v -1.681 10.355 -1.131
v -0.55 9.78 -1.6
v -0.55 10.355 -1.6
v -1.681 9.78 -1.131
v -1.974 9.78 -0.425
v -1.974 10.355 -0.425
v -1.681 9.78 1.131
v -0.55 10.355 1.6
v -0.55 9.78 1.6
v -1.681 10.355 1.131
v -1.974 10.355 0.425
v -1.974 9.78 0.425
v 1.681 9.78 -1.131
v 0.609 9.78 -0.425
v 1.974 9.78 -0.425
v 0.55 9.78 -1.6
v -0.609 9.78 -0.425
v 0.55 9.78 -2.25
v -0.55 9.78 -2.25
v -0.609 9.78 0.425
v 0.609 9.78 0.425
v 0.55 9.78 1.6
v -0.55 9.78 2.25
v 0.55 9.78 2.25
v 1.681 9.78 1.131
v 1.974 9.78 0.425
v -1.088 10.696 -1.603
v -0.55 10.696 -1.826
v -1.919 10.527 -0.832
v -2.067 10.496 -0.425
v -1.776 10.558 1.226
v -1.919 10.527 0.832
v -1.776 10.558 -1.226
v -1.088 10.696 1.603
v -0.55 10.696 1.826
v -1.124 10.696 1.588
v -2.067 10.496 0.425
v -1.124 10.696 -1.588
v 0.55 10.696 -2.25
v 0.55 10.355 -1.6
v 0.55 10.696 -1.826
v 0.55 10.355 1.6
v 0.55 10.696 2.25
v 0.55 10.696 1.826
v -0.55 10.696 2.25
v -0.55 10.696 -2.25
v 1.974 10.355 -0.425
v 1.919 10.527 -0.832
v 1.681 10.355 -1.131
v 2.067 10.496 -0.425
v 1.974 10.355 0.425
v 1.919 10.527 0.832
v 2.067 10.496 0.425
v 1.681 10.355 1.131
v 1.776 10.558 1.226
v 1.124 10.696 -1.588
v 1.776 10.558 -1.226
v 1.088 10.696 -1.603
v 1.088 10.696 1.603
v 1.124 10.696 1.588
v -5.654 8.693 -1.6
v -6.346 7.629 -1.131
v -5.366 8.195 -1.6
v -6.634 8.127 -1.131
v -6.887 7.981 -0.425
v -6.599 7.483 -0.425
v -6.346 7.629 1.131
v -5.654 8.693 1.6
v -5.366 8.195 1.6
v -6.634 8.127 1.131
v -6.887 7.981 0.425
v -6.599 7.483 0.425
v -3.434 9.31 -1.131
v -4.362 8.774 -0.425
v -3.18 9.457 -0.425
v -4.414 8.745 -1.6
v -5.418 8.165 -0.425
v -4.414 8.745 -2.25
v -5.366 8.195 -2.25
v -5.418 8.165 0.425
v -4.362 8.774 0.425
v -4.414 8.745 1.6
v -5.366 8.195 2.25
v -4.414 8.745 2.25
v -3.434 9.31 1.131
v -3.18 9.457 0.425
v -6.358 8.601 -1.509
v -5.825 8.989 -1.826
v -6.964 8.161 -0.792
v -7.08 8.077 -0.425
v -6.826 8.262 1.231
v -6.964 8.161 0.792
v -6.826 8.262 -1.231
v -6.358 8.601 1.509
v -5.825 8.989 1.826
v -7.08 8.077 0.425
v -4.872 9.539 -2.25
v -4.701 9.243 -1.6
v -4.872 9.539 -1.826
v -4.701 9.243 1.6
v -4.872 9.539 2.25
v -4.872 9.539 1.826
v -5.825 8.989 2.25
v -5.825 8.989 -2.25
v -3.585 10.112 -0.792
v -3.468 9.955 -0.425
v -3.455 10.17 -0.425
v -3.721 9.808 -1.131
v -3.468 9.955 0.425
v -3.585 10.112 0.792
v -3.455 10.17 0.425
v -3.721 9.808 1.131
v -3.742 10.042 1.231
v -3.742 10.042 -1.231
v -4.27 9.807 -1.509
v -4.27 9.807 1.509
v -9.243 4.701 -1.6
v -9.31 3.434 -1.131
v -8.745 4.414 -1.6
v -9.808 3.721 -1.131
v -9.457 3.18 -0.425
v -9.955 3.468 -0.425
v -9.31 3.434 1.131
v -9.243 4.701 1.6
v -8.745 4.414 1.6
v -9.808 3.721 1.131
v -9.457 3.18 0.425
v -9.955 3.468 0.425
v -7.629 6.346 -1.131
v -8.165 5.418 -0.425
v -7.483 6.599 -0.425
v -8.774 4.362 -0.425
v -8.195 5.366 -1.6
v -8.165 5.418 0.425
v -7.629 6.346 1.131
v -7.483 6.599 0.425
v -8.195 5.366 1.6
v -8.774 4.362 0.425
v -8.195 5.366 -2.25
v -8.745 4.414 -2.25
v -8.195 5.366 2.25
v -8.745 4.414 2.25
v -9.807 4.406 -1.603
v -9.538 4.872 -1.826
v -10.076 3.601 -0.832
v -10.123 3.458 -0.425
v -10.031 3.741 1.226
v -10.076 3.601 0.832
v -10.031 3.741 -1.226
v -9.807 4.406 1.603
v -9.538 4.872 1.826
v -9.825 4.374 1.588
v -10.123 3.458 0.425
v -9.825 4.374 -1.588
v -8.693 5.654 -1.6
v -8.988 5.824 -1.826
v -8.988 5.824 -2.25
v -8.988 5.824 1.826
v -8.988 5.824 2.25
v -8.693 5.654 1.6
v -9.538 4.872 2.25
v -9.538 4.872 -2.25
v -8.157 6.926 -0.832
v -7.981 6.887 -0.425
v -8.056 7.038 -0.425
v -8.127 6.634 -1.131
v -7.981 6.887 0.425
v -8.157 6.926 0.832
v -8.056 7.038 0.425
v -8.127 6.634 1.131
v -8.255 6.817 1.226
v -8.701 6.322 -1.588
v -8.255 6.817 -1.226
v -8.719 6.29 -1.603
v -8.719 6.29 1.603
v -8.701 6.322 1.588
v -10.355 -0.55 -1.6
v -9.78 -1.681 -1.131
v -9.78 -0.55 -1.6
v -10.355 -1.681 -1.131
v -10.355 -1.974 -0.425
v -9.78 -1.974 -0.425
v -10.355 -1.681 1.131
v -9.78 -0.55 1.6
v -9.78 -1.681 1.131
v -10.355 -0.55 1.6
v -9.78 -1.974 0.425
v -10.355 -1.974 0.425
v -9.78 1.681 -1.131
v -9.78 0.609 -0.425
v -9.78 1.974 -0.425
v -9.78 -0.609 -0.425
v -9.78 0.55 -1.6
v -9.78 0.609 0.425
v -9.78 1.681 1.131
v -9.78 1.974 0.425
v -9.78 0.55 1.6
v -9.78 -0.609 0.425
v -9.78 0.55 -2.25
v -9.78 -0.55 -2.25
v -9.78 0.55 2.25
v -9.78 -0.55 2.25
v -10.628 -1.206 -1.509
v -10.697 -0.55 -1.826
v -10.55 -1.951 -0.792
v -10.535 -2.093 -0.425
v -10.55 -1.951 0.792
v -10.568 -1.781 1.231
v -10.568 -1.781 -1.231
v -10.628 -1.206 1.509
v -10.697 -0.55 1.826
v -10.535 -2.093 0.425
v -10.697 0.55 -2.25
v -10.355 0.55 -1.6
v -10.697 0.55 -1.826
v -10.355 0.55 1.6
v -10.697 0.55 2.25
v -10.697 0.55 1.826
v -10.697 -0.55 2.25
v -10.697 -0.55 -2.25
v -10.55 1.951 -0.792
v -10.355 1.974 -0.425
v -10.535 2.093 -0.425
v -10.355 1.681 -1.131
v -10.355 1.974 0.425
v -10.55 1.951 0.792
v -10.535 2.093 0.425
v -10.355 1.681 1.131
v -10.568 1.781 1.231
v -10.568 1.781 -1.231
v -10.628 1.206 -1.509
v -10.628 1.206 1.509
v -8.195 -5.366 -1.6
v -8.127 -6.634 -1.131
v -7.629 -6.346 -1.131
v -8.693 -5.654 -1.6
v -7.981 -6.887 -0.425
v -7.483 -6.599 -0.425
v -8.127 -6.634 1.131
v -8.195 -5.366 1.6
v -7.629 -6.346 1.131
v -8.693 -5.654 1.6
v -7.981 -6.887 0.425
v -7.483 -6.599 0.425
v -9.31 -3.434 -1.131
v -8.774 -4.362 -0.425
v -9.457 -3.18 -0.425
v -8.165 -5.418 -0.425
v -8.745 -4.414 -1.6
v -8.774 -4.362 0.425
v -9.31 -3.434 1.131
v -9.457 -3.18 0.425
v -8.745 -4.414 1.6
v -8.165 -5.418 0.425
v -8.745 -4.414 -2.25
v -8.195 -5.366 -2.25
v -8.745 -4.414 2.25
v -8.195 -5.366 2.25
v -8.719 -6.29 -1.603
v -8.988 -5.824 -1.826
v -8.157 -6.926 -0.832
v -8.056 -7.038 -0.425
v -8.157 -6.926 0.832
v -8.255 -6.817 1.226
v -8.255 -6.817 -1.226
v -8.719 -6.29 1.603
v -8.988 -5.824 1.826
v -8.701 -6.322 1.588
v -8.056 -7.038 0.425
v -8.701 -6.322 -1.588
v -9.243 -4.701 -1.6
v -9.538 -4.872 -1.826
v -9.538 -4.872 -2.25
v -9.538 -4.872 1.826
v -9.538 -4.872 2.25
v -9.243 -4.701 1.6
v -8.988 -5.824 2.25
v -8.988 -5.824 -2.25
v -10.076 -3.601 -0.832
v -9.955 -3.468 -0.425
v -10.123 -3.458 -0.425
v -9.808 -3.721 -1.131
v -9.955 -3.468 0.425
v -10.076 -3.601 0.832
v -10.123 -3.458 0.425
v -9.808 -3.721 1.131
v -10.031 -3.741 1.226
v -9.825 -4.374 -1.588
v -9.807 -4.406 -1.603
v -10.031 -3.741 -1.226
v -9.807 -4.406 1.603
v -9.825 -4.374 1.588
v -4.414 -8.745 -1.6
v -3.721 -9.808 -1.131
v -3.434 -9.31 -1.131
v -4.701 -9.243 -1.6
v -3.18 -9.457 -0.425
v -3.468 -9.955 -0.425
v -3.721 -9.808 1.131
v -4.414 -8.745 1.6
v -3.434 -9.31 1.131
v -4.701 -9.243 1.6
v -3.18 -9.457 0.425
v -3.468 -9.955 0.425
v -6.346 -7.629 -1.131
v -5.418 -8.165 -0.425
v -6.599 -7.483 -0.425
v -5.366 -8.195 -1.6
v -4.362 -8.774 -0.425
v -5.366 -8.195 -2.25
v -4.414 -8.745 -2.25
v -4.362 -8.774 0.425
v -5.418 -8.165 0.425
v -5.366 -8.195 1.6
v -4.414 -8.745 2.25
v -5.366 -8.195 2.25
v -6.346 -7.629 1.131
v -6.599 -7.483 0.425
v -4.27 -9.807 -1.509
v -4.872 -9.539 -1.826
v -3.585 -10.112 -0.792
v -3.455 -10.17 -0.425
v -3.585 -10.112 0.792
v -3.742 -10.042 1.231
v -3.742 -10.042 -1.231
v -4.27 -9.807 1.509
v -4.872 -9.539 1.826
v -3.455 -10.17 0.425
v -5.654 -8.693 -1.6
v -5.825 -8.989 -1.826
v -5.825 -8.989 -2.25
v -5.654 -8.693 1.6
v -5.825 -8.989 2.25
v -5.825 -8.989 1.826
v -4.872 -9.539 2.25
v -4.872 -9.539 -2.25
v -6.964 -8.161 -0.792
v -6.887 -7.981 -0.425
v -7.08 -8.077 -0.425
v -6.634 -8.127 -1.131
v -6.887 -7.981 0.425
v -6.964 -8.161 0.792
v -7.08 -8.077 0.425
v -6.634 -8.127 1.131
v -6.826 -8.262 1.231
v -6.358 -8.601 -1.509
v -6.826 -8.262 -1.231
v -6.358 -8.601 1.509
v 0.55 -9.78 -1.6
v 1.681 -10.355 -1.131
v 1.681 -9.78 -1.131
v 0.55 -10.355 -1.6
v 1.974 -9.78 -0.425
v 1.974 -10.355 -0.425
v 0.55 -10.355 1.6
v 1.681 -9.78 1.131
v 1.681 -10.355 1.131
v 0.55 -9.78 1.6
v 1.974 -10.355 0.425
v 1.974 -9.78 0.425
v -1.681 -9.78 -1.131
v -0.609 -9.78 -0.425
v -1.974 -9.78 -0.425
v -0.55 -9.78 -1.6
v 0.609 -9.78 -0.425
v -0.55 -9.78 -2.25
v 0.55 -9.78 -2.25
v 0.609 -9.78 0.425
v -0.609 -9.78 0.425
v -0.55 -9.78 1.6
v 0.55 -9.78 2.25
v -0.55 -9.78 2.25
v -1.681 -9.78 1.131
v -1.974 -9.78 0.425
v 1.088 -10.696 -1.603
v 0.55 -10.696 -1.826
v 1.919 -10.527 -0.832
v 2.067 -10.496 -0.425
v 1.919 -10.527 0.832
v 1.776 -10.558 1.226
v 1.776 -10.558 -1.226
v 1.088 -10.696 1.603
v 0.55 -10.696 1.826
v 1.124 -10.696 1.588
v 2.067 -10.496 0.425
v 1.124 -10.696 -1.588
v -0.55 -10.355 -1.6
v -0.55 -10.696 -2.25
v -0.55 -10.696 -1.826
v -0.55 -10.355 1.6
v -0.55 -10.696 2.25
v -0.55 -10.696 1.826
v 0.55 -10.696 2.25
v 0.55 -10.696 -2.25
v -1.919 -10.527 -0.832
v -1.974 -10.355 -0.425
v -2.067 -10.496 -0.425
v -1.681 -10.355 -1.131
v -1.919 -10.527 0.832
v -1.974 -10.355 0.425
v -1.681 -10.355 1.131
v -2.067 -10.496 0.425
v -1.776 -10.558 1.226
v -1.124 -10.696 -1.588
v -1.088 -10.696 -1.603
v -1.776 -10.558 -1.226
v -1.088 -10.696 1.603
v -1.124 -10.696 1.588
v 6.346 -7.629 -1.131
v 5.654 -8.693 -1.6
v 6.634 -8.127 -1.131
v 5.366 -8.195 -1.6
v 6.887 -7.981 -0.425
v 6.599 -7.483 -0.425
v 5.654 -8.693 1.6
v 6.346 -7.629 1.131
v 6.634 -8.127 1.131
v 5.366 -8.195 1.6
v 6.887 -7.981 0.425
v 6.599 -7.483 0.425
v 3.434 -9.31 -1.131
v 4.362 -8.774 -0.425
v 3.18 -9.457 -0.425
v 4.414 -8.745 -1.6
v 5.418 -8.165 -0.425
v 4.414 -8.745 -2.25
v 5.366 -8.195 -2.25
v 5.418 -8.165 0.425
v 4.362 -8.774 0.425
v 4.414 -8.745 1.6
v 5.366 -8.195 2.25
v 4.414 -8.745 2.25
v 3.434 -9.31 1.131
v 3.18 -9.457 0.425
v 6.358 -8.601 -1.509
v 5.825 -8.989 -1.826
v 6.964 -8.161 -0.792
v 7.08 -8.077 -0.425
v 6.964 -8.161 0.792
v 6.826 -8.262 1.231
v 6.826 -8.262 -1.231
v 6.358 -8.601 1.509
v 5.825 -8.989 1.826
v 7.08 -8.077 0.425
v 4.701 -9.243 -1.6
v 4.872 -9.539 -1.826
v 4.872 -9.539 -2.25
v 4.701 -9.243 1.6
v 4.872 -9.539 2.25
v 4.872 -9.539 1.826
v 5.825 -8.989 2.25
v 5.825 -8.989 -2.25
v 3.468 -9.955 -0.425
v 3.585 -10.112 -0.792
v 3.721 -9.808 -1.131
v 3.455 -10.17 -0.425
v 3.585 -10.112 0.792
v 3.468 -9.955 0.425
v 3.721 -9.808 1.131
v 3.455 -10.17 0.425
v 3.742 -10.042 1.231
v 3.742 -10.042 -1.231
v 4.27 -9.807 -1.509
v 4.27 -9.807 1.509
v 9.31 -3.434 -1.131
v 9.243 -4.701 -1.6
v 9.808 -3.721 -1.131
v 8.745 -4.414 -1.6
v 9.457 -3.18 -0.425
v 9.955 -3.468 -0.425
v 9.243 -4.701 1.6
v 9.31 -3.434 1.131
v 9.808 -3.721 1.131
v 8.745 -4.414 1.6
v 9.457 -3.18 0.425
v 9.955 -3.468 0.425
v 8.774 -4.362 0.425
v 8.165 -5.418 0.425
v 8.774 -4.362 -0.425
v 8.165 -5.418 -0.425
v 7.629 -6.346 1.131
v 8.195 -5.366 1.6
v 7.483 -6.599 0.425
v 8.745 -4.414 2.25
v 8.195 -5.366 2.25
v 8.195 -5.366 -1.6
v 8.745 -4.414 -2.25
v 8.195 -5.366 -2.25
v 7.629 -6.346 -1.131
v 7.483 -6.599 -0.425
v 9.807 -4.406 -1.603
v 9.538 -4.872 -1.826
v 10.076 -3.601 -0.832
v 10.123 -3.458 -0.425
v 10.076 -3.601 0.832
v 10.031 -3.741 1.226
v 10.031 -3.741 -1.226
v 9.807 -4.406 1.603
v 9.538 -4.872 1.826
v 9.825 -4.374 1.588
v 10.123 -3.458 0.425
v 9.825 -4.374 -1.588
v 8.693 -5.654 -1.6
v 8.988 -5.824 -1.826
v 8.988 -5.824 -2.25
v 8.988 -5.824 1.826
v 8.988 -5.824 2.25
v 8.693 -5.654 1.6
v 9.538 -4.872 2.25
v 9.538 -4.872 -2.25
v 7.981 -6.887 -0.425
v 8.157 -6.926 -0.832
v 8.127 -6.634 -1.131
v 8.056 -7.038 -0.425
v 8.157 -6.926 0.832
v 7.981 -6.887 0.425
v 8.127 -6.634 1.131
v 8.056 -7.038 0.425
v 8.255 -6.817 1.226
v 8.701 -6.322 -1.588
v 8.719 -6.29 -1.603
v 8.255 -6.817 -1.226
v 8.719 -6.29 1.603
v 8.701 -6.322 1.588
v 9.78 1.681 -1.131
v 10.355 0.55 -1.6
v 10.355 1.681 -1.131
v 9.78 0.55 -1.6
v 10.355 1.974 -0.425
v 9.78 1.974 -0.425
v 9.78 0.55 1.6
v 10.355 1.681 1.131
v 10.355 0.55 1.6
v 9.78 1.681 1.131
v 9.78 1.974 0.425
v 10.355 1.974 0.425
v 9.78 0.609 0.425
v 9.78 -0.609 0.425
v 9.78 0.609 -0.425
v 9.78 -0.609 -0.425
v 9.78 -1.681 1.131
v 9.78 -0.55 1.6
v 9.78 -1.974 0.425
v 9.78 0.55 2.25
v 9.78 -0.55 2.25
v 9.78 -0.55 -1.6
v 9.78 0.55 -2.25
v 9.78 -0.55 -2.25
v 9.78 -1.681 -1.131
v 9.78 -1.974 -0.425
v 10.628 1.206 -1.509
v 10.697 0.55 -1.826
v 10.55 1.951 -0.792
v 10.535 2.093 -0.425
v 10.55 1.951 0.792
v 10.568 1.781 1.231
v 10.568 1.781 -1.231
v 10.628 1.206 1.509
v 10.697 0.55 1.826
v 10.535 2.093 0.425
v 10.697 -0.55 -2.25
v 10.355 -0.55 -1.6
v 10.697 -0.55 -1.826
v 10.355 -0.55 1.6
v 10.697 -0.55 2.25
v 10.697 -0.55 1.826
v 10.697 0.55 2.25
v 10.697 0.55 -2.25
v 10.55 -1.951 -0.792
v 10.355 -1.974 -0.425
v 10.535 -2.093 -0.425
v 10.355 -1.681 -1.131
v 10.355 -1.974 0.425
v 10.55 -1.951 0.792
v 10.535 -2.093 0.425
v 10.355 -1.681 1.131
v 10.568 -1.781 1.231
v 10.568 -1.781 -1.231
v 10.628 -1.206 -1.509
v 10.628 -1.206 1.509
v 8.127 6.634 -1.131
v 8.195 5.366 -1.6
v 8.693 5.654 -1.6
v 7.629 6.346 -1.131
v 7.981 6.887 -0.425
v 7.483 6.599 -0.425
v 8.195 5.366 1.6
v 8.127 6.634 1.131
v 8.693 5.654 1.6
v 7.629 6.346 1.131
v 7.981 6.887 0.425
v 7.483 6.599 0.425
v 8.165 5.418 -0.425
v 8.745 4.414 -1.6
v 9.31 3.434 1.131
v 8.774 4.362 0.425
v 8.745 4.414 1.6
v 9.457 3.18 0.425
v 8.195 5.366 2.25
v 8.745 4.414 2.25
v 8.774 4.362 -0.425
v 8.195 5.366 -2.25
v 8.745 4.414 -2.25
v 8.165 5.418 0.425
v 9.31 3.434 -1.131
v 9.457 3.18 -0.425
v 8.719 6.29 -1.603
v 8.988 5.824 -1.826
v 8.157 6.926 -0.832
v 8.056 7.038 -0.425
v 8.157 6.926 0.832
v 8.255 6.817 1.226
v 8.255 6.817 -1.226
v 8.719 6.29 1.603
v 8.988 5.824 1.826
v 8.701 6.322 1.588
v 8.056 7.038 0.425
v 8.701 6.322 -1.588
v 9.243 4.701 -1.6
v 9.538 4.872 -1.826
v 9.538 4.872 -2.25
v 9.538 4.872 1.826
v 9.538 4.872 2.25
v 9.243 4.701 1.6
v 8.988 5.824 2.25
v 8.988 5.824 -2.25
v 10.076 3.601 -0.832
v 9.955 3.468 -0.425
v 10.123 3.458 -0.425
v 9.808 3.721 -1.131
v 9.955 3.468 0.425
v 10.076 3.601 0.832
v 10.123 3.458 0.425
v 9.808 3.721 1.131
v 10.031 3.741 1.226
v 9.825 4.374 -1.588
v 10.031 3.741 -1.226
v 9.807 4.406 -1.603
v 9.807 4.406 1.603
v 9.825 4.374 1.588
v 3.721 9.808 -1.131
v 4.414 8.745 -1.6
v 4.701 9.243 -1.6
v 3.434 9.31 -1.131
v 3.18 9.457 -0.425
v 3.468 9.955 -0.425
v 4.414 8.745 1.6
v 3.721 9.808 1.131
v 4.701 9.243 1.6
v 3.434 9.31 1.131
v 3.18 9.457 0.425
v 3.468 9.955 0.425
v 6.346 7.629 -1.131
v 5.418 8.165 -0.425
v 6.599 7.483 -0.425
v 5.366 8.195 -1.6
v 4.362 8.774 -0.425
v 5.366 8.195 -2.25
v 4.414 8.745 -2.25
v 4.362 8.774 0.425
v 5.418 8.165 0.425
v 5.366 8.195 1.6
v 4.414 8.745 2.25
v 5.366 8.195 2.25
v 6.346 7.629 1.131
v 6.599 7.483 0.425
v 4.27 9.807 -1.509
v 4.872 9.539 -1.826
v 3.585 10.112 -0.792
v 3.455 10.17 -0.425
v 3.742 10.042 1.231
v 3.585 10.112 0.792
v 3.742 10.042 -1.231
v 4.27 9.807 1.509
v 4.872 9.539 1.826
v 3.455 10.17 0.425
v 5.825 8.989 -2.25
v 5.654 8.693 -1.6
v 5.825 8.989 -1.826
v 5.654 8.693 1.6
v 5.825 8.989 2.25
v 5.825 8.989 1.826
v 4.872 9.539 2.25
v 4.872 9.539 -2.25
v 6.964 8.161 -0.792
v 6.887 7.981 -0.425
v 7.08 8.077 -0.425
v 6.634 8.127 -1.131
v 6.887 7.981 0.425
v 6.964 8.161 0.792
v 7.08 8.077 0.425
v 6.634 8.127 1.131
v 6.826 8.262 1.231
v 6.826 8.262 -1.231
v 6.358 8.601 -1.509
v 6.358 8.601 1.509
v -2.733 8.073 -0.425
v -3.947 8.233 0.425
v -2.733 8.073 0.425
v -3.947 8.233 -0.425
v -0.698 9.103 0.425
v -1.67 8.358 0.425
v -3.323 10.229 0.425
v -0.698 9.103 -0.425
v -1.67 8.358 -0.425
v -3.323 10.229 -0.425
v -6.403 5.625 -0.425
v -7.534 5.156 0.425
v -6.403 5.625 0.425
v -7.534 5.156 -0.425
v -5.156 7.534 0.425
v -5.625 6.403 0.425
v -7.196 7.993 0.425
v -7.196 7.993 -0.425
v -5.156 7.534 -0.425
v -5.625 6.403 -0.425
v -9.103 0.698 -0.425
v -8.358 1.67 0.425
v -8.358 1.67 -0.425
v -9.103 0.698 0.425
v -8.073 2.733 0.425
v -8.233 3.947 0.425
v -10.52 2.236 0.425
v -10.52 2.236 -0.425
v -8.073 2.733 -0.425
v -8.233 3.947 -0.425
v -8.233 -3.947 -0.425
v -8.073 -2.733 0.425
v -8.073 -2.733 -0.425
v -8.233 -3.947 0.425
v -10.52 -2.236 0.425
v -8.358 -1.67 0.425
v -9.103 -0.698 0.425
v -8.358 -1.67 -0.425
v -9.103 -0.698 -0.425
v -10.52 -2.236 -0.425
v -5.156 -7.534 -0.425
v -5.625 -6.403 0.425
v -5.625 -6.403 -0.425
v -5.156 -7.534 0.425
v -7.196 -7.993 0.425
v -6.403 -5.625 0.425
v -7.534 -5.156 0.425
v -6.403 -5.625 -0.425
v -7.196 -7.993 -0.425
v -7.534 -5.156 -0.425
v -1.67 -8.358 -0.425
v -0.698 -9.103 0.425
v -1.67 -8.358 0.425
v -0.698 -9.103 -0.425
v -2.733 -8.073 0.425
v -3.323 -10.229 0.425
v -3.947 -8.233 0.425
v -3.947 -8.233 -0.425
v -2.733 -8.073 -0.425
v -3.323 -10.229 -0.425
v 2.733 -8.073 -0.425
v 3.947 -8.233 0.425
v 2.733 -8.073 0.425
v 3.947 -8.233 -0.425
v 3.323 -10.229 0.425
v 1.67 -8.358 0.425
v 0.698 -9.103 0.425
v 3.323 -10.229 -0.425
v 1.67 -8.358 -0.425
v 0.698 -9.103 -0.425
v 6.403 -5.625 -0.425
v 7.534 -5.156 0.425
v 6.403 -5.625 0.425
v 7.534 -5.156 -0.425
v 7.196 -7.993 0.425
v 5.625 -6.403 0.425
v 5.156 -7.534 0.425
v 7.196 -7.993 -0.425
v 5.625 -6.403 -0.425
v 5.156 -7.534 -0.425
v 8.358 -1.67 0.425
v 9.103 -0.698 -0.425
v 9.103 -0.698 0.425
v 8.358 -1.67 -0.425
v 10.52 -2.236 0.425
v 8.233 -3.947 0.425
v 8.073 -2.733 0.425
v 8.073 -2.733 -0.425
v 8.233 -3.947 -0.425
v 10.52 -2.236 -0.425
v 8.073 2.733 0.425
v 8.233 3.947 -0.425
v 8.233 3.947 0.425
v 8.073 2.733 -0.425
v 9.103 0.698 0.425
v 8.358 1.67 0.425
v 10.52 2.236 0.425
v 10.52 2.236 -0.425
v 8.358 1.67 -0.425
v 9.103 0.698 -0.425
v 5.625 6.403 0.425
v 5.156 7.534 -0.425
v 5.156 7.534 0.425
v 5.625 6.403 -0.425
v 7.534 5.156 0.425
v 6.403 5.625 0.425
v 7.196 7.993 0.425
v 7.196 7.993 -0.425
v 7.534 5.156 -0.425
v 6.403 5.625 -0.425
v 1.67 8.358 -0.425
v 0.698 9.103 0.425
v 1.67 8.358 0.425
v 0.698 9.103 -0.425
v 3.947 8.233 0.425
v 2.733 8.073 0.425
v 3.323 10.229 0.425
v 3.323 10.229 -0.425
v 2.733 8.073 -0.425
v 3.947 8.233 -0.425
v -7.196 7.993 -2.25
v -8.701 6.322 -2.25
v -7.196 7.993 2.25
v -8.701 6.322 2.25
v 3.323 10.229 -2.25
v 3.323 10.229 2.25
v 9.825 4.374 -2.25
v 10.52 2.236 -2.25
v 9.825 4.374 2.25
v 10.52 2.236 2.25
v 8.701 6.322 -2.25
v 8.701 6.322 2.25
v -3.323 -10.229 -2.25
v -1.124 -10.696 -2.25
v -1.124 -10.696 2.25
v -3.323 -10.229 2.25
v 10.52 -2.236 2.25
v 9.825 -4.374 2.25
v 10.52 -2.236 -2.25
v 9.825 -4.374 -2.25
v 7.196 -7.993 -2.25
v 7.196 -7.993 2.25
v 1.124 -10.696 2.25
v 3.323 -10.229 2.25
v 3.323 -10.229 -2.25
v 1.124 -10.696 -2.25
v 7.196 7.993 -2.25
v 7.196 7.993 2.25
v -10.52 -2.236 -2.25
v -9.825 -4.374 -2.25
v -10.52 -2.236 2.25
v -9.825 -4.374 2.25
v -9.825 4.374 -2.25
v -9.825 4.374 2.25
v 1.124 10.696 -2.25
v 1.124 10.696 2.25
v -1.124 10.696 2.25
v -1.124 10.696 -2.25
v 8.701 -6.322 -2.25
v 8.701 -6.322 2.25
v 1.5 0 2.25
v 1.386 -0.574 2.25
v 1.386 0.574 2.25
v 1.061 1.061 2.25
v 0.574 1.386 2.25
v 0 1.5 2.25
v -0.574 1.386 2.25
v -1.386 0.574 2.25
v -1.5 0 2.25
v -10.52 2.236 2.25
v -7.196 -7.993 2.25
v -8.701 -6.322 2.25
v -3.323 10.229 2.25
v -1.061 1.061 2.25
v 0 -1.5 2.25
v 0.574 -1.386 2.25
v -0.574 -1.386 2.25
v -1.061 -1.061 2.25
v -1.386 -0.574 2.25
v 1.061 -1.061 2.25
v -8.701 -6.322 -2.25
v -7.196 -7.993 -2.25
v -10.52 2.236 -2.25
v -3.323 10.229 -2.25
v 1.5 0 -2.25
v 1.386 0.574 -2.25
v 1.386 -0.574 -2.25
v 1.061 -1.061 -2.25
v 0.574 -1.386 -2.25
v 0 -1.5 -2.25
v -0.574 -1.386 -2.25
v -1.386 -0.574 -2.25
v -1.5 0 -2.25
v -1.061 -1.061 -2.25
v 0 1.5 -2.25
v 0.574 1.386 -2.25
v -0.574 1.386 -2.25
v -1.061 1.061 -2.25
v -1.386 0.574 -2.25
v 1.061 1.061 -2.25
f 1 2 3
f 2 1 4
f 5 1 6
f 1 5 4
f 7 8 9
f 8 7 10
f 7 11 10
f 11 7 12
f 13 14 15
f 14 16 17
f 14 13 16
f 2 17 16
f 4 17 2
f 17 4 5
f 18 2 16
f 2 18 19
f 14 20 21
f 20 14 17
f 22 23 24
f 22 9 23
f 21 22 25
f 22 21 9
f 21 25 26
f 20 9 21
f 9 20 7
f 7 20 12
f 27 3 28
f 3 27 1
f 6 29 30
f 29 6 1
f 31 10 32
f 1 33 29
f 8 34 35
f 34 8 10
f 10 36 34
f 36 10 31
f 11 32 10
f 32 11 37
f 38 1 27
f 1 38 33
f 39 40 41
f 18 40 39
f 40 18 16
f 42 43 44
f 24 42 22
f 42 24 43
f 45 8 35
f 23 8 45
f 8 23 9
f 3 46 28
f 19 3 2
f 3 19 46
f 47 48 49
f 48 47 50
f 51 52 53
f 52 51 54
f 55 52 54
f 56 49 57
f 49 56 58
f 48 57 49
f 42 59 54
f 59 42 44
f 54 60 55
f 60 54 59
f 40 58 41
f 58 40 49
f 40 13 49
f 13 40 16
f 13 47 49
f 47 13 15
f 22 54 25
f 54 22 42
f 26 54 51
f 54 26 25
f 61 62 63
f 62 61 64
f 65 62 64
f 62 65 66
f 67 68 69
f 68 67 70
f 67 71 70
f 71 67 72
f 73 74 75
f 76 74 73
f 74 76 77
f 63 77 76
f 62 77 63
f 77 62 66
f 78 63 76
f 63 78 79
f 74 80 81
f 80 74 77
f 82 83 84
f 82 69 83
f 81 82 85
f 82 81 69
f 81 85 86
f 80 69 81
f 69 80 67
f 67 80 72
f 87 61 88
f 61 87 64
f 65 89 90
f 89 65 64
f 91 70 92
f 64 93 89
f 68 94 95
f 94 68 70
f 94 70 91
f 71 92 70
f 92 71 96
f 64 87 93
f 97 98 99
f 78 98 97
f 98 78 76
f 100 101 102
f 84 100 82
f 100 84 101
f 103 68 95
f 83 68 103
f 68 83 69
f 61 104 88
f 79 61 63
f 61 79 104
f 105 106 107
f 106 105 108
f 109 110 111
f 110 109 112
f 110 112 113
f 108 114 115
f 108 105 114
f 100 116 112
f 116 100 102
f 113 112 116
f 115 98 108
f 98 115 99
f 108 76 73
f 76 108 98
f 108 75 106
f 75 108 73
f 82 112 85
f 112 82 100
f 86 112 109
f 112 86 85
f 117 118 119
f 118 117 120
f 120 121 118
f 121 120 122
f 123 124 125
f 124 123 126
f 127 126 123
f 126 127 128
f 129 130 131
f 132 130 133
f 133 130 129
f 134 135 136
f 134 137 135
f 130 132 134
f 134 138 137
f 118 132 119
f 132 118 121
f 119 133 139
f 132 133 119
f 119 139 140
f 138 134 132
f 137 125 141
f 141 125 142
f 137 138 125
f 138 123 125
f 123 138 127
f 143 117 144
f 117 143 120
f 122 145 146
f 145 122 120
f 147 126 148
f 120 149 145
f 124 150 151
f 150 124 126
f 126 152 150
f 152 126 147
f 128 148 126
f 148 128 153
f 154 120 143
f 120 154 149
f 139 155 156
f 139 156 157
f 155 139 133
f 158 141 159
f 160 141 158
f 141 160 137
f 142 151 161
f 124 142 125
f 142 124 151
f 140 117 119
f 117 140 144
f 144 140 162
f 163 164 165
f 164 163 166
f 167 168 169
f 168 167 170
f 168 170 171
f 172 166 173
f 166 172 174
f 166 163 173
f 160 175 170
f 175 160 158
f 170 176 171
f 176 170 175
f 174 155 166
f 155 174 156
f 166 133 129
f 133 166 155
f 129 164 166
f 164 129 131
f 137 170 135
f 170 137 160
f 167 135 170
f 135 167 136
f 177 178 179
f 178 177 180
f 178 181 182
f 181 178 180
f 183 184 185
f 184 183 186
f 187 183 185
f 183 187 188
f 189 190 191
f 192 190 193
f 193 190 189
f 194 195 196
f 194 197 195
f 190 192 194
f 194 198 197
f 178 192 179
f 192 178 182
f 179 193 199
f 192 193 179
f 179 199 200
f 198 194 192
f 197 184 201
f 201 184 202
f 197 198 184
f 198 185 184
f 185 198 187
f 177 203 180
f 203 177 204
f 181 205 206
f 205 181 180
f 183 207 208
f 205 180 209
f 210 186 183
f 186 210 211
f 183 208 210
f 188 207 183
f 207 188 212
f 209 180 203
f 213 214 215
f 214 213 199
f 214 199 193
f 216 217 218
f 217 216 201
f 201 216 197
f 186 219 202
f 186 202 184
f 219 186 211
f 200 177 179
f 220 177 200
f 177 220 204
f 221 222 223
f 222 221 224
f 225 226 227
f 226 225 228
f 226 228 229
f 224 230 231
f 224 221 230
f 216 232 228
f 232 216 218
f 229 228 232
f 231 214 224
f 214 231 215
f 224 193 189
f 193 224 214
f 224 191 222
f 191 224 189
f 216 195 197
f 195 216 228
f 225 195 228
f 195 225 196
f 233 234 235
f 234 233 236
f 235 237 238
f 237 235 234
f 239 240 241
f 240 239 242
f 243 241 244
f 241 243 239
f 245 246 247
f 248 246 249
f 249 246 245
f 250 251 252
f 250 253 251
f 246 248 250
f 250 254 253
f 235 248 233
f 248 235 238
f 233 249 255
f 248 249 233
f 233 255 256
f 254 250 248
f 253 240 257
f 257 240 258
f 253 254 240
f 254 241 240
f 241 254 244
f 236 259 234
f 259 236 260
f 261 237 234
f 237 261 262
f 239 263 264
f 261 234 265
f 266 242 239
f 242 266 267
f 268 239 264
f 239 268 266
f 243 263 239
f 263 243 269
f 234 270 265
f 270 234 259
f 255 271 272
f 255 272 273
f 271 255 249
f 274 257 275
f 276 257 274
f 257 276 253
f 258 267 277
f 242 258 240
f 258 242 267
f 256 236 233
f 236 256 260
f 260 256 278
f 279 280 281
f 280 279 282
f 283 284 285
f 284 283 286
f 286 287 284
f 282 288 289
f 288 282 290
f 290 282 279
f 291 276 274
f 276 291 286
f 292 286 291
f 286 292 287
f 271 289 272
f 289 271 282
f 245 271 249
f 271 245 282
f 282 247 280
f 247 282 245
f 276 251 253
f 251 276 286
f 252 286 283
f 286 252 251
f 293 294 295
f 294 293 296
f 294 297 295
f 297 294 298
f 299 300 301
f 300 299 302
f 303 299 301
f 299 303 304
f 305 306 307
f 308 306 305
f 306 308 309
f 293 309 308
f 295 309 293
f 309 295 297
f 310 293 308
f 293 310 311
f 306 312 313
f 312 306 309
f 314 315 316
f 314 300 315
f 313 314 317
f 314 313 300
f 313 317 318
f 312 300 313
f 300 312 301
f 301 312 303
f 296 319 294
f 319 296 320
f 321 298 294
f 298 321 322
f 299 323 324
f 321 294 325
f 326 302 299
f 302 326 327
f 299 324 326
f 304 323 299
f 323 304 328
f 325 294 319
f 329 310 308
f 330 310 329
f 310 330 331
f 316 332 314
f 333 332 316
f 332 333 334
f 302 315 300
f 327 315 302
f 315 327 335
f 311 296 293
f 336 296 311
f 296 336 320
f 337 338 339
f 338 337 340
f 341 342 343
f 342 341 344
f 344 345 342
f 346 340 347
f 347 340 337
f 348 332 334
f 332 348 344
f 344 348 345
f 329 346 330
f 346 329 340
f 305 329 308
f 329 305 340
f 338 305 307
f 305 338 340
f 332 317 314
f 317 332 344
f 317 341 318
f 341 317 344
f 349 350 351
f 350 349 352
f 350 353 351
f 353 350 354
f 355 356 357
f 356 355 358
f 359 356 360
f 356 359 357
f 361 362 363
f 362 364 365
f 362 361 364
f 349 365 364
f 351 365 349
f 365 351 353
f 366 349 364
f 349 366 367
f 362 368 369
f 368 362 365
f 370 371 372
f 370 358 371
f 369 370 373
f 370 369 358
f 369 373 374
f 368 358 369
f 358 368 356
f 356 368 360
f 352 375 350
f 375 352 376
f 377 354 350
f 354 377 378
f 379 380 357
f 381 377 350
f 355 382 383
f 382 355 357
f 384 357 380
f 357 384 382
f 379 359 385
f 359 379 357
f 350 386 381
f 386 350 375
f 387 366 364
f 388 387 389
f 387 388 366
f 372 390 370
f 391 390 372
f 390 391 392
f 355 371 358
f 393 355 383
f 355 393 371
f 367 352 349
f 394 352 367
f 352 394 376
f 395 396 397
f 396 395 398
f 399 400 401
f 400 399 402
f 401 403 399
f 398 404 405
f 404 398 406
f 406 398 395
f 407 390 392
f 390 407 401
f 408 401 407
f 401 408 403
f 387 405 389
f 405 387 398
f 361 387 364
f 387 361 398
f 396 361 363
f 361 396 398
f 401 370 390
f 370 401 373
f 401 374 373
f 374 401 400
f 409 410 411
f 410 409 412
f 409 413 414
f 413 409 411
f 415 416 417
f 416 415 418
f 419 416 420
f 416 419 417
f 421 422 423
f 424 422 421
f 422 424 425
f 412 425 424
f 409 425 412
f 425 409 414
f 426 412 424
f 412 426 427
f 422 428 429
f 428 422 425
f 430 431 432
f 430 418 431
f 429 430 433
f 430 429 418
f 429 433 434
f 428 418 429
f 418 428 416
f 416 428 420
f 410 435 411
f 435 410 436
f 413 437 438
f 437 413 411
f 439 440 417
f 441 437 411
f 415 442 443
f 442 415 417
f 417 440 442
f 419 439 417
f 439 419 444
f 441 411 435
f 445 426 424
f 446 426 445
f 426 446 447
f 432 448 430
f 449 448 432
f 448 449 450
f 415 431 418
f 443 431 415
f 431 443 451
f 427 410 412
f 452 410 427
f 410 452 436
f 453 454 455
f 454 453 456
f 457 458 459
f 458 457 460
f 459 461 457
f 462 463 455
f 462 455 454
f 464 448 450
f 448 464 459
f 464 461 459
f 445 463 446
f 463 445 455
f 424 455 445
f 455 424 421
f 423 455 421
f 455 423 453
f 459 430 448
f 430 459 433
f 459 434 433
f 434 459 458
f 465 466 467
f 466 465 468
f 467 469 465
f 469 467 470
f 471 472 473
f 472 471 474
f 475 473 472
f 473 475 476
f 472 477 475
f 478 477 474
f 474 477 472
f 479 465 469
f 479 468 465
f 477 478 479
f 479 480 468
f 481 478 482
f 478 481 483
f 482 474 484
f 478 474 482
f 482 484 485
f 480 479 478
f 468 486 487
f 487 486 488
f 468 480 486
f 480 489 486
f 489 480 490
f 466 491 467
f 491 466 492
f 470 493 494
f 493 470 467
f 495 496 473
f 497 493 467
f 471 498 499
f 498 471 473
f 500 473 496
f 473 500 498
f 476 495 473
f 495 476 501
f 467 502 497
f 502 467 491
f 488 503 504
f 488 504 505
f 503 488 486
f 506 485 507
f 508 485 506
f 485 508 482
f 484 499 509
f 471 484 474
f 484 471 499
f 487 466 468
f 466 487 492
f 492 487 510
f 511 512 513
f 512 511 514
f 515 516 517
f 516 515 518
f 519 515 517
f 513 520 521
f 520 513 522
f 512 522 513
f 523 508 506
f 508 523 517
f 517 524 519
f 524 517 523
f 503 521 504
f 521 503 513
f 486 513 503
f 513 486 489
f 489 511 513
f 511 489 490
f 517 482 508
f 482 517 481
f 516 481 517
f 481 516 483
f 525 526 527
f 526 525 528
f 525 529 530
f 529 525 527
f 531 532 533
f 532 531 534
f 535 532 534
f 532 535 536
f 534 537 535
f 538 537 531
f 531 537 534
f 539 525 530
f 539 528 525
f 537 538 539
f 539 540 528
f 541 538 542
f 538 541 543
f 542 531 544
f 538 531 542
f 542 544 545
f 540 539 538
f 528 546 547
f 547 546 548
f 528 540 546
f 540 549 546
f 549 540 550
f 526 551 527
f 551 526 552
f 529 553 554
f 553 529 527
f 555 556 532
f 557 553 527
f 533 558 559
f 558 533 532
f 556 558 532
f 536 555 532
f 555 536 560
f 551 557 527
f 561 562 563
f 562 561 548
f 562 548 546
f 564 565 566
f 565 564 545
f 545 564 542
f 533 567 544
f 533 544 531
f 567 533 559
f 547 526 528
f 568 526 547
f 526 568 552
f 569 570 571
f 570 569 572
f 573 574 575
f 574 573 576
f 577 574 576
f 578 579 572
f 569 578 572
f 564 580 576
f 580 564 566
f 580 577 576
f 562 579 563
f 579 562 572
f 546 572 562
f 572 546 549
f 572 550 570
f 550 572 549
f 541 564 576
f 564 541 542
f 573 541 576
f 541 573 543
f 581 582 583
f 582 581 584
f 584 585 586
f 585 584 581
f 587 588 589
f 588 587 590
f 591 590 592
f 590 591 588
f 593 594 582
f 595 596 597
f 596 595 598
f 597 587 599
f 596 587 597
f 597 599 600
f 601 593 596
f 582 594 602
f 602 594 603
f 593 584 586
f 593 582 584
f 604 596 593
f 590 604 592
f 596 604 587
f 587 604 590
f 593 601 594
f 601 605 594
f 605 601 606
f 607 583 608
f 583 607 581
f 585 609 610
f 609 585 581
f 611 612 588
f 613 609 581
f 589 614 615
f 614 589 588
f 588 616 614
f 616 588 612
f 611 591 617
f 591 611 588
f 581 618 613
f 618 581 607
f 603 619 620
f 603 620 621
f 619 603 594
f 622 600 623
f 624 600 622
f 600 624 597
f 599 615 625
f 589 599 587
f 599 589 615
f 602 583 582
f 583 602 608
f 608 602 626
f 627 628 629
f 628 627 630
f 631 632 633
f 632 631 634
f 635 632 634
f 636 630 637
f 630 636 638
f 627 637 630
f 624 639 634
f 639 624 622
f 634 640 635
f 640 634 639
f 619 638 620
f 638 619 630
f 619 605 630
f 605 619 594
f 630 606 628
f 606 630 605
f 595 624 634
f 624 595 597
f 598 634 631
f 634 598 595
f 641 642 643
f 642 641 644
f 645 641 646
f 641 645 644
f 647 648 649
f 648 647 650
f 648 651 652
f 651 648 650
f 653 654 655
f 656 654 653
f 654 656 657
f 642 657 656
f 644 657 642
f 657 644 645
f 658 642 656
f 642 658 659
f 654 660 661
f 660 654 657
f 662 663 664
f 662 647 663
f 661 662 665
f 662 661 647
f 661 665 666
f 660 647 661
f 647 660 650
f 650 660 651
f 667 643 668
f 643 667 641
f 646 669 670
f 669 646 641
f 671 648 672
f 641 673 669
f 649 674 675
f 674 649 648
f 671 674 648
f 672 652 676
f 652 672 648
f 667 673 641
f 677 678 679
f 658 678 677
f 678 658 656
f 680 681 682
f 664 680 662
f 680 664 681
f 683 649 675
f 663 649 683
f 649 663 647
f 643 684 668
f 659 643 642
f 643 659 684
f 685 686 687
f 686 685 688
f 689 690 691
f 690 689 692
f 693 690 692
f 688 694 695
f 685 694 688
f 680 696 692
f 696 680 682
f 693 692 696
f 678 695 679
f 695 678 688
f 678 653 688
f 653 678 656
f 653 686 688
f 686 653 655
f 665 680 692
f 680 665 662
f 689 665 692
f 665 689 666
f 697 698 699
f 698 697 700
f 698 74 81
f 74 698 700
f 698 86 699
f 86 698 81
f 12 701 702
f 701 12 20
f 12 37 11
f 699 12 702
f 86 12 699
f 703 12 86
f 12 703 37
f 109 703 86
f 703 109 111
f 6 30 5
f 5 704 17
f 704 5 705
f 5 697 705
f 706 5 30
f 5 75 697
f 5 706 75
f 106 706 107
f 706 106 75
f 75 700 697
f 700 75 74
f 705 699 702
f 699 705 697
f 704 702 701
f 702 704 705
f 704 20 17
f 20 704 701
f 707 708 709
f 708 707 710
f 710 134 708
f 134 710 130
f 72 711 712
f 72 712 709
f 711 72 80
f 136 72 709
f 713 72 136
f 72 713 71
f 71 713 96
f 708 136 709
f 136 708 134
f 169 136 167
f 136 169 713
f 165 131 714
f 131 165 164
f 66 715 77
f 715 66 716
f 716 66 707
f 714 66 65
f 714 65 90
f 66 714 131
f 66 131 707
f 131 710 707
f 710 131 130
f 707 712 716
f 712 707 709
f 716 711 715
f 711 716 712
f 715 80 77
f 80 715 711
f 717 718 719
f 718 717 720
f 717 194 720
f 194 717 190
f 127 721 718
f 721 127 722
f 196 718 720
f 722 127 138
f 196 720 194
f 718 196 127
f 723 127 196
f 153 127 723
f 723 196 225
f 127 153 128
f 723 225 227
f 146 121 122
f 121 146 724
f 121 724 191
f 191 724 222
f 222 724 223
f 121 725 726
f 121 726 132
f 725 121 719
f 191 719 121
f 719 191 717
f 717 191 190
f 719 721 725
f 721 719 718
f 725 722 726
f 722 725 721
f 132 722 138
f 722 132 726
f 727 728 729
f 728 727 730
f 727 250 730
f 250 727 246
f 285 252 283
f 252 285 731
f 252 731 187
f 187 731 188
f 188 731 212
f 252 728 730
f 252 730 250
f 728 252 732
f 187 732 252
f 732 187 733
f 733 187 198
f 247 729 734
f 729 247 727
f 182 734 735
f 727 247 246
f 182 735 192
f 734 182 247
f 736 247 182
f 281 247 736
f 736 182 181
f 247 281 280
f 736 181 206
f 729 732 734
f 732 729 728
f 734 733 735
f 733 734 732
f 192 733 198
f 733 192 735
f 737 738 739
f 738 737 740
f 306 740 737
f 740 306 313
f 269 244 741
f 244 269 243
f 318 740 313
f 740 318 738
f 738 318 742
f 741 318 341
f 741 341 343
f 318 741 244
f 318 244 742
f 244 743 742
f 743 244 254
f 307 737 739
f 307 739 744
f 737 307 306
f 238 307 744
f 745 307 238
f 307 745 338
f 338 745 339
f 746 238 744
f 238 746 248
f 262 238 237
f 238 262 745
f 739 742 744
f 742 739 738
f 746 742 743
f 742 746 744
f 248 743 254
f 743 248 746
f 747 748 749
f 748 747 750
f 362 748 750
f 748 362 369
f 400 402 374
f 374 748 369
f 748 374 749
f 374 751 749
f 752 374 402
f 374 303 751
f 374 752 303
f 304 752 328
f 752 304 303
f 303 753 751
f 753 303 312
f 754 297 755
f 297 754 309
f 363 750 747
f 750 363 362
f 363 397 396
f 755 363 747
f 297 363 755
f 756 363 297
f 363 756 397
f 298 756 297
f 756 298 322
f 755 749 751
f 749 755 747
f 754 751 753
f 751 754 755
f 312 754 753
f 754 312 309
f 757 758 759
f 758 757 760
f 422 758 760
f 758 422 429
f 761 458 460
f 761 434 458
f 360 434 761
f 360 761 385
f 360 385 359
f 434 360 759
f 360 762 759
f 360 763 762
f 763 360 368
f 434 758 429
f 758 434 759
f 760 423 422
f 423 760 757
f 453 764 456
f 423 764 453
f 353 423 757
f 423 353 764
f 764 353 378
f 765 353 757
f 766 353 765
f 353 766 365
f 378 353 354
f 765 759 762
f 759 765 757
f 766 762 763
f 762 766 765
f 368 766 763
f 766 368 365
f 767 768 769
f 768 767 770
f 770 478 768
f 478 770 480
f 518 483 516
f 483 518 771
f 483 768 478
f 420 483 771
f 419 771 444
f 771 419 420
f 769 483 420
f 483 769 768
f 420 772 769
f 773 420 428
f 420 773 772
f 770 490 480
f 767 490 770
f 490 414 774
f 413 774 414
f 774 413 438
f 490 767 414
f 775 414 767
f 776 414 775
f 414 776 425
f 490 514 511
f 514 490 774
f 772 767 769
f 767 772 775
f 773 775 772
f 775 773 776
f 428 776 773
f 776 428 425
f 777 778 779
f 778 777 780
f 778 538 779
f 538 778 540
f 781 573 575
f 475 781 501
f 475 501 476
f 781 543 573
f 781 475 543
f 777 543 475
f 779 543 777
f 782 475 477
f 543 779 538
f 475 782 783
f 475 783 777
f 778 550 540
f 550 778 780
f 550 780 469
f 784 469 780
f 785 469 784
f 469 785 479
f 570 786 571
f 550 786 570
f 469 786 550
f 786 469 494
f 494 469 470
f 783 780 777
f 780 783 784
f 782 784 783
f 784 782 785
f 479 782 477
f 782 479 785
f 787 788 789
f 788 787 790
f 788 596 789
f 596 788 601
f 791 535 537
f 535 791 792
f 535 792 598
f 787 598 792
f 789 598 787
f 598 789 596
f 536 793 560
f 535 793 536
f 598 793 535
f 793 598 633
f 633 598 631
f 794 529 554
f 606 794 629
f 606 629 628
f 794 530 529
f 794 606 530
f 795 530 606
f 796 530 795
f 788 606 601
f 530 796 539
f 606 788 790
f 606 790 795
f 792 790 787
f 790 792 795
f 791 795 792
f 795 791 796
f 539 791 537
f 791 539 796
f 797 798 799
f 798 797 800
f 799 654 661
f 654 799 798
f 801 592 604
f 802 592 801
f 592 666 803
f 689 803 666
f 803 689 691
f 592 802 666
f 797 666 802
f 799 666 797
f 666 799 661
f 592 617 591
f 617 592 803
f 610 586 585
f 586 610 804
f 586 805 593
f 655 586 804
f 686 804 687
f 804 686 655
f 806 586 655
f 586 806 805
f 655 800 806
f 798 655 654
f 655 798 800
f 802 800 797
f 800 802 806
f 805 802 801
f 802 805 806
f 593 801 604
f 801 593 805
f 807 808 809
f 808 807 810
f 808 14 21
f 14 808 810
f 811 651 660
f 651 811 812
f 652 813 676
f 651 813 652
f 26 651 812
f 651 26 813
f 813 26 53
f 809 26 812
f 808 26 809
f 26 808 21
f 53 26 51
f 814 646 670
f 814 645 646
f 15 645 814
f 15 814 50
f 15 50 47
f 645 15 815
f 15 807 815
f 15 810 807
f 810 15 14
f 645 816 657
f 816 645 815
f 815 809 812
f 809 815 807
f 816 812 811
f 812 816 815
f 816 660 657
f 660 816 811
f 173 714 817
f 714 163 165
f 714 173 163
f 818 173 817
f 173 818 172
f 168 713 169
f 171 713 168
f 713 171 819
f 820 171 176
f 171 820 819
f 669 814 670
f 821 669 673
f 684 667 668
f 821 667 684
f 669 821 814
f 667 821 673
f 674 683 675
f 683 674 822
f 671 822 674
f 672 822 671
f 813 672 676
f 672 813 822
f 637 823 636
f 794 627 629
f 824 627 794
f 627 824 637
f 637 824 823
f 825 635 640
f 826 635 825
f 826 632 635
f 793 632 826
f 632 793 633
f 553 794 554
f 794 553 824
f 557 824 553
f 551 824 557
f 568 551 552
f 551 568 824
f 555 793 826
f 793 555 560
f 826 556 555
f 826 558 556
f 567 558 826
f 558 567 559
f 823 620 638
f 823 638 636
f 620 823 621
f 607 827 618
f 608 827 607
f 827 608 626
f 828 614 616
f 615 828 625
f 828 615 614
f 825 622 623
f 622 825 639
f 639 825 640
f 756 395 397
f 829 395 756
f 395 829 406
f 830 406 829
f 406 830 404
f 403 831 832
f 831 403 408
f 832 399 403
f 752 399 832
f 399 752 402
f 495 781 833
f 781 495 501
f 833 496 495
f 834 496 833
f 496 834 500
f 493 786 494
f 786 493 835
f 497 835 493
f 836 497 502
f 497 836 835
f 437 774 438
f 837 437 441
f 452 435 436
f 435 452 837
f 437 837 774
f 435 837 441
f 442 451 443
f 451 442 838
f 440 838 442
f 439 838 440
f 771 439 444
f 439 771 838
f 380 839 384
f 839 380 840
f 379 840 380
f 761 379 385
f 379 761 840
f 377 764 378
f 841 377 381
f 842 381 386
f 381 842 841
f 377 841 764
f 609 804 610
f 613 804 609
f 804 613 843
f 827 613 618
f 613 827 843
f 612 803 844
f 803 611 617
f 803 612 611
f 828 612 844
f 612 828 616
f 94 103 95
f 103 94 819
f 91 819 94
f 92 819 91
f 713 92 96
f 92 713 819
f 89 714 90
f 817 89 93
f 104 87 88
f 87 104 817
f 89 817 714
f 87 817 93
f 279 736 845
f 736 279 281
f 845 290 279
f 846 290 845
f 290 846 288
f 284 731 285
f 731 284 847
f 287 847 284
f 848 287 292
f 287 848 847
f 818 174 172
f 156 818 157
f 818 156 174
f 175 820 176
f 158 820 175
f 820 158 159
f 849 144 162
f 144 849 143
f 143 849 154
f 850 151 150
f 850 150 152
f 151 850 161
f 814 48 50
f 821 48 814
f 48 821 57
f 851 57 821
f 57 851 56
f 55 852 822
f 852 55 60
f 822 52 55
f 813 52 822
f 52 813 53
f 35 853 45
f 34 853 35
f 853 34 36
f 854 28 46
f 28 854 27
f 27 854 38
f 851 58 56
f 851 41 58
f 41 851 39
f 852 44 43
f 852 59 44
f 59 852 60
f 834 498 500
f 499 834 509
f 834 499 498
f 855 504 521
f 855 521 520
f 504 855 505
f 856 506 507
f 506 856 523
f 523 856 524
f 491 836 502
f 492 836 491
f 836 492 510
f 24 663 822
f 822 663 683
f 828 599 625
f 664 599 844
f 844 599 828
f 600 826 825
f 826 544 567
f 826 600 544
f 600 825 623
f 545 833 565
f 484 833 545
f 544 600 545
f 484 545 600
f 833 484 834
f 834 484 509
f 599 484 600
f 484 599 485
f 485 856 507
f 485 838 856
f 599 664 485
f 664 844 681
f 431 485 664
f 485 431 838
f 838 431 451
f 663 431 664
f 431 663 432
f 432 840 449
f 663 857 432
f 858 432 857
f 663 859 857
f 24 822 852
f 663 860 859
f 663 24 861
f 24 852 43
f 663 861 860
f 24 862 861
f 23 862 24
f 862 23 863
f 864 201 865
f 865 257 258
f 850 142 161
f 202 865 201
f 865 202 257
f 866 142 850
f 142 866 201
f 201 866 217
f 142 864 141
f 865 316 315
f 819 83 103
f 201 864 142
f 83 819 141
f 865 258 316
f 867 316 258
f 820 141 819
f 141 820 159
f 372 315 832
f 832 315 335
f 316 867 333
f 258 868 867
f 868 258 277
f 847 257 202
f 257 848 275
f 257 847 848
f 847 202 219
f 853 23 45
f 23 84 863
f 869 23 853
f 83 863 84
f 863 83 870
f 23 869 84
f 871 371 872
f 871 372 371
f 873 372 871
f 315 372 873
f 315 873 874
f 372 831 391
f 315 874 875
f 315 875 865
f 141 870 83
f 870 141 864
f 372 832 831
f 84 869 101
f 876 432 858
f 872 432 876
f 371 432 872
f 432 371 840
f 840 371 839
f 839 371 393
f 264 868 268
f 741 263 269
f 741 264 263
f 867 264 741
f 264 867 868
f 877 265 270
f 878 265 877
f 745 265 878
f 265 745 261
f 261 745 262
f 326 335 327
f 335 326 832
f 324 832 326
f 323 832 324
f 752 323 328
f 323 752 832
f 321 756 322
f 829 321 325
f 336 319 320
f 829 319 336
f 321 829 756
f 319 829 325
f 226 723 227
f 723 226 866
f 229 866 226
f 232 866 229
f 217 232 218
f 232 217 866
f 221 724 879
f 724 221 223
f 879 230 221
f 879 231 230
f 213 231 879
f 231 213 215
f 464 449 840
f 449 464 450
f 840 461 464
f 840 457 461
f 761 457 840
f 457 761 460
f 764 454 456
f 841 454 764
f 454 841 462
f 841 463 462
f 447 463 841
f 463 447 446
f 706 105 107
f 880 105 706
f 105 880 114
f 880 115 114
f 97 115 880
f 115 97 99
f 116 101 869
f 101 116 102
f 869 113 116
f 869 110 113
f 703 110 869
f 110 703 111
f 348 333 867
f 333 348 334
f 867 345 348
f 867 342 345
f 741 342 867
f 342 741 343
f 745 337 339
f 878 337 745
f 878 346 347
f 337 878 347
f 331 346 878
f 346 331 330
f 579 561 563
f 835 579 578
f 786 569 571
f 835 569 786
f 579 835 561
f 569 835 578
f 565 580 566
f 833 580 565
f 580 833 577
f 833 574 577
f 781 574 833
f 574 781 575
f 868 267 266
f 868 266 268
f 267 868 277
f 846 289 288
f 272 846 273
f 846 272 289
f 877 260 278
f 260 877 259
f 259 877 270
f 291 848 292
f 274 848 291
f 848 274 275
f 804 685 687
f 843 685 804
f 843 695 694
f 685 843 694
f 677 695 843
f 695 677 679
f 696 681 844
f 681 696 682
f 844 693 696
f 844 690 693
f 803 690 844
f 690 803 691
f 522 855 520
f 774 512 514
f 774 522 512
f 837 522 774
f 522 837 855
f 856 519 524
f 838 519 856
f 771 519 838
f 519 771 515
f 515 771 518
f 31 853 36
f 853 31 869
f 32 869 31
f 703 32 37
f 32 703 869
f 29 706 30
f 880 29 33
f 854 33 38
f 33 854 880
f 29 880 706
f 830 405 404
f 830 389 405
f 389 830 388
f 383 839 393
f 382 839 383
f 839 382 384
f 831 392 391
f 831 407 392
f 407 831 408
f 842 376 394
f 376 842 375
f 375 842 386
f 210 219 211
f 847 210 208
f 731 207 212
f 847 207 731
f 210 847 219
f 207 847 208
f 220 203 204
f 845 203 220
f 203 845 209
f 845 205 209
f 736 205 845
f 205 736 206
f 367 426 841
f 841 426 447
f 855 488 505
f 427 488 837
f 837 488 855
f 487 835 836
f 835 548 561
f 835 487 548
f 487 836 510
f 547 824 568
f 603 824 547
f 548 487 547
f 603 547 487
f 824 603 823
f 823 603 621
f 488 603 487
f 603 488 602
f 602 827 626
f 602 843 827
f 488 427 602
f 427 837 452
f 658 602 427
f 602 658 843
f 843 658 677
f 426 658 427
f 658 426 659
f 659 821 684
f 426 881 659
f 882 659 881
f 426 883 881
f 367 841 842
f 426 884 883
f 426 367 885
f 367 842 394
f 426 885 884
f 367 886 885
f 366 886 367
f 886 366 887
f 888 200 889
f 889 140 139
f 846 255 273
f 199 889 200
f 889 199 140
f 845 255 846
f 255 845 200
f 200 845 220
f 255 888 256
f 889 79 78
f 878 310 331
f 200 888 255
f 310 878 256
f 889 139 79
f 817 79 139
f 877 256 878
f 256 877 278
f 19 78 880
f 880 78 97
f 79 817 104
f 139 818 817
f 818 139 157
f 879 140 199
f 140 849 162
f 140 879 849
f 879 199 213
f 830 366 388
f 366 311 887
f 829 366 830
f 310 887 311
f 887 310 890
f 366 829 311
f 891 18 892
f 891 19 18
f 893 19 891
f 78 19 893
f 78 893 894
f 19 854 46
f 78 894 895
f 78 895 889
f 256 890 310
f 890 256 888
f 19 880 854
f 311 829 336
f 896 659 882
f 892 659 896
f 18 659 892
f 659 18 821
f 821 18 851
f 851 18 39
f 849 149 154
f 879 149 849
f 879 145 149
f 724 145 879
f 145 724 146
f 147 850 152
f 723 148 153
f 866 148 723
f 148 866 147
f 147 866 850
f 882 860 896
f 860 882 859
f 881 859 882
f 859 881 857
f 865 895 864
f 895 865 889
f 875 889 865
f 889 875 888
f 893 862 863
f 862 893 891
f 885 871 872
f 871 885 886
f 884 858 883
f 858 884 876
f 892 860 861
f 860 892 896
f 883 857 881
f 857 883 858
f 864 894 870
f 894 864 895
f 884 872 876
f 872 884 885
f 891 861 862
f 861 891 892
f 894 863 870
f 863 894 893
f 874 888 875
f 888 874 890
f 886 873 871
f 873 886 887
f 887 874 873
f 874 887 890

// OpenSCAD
//ChainLink_Drive_PulleyBlank-Thingiverse.scad
//This is a parametric model of a chain drive pulley.
//The chain type is any link style chain rather than
//proper chain-drive chain.
//The size of the links and the number of link pairs
// around the drum determine its size.

//By Hamish Trolove - www.techmonkeybusiness.com
//Written in 2018
//Licensed under a Creative Commons license - attribution
// share alike. CC-BY-SA

//This version is only the pulley drum to allow you to
//easily modify it with other vertex modelling tools
//to fit whatever you wish.
//There is another version available which includes the
//pulley attachment to the shaft.

//No extra libraries are required and it works under 
//      OpenSCAD 2014 and OpenSCAD 2015.


//Basic Dimensions

//Link length - outside dimension
LLength = 4; 

//Link width - outside dimension
LWidth = 2.9; 

//Link wire thickness
Lthickness = 0.65; 

//Printing Tolerance
PTol = 0.15; 

//Printing Allowance for the "radially" orientated link thickness
PTolThk = 0.2; 

//A factor for creating a clear bar on either side of the link
WClr = 2;  
            
//Chain cylinder resolution (fast but rough = 8)       
Rez = 8; 

//Resolution of the axle hole
AxleRez = 16; 

//The number of chain link pairs around the pulley.  Please note this is pairs of links not the number of single links.
N = 12; 

//Width of the Pulley Main Drum
PWidth = 4.5; 

//axle diameter
AxleD = 3; 


//Derived Dimensions
LStraight = LLength - LWidth; //length of straight
                //section between link's rounded ends.
LAngle = 180/N; //Angle between links

A = LWidth/2 - Lthickness;
B = A * cos(LAngle);

Leff = LStraight + 2*B; //The effective length to
                //account for overlap of the links 
PCD = 2 * N * Leff/PI;
//echo("Factor A = ",A, "factor B = ",B);
//echo("Angle between links = ",LAngle,"Pitch Circle Diameter = ",PCD,"Effective length = ", Leff);
//echo("Length of Chain straight section = ",LStraight);

//Pulley body
difference()
{
    cylinder(h=PWidth,r=PCD/2+Lthickness, center = true);

 
    //The Axle
    cylinder(h=PWidth*10,r=AxleD/2, center = true,$fn=AxleRez);
    
    //Chain link Recess Calculations
    for (ang = [0:LAngle*2:360-LAngle*2])
    {
        rotate([0,0,ang])
        {
    
    //Creating the Tangential Link Outline
            translate([0,PCD/2,0])
            {
                rotate([-90,0,0])
                {
                    translate([-LStraight/2,0,0])cylinder(h=Lthickness,r=LWidth/2+PTol,center=true,$fn=Rez);
                    translate([-LStraight/2,0,Lthickness-PTol/2])cylinder(h=Lthickness,r1=LWidth/2+PTol,r2= 1.4*LWidth/2 ,center=true,$fn=Rez); 
                    cube(size=[LStraight,LWidth+PTol*2+WClr*2,Lthickness],center = true);
                    translate([0,0,Lthickness-PTol/2])cube(size = [LStraight,LWidth+PTol*2+WClr*2,Lthickness],center = true);
                    translate([LStraight/2,0,Lthickness-PTol/2])cylinder(h=Lthickness,r1=LWidth/2+PTol,r2= 1.4*LWidth/2 ,center=true,$fn=Rez);
                    translate([LStraight/2,0,0])cylinder(h=Lthickness,r= LWidth/2+PTol,center=true,$fn=Rez);
                 
                }
            }
        }
    }
    
    
    //Radial Link orientation
    for (ang = [LAngle:LAngle*2:360-LAngle])
    {
        rotate([0,0,ang])
        {
    
            translate([0,PCD/2,0])
            {
            
                translate([-LStraight/2,0,0])cylinder(h=Lthickness+PTolThk,r=LWidth/2+PTol,center=true,$fn=Rez);
                cube(size=[LStraight,LWidth+PTol*2,Lthickness+PTolThk],center = true);
                translate([LStraight/2,0,0])cylinder(h=Lthickness+PTolThk,r=LWidth/2+PTol,center=true,$fn=Rez);

            }
        }
    }

}
